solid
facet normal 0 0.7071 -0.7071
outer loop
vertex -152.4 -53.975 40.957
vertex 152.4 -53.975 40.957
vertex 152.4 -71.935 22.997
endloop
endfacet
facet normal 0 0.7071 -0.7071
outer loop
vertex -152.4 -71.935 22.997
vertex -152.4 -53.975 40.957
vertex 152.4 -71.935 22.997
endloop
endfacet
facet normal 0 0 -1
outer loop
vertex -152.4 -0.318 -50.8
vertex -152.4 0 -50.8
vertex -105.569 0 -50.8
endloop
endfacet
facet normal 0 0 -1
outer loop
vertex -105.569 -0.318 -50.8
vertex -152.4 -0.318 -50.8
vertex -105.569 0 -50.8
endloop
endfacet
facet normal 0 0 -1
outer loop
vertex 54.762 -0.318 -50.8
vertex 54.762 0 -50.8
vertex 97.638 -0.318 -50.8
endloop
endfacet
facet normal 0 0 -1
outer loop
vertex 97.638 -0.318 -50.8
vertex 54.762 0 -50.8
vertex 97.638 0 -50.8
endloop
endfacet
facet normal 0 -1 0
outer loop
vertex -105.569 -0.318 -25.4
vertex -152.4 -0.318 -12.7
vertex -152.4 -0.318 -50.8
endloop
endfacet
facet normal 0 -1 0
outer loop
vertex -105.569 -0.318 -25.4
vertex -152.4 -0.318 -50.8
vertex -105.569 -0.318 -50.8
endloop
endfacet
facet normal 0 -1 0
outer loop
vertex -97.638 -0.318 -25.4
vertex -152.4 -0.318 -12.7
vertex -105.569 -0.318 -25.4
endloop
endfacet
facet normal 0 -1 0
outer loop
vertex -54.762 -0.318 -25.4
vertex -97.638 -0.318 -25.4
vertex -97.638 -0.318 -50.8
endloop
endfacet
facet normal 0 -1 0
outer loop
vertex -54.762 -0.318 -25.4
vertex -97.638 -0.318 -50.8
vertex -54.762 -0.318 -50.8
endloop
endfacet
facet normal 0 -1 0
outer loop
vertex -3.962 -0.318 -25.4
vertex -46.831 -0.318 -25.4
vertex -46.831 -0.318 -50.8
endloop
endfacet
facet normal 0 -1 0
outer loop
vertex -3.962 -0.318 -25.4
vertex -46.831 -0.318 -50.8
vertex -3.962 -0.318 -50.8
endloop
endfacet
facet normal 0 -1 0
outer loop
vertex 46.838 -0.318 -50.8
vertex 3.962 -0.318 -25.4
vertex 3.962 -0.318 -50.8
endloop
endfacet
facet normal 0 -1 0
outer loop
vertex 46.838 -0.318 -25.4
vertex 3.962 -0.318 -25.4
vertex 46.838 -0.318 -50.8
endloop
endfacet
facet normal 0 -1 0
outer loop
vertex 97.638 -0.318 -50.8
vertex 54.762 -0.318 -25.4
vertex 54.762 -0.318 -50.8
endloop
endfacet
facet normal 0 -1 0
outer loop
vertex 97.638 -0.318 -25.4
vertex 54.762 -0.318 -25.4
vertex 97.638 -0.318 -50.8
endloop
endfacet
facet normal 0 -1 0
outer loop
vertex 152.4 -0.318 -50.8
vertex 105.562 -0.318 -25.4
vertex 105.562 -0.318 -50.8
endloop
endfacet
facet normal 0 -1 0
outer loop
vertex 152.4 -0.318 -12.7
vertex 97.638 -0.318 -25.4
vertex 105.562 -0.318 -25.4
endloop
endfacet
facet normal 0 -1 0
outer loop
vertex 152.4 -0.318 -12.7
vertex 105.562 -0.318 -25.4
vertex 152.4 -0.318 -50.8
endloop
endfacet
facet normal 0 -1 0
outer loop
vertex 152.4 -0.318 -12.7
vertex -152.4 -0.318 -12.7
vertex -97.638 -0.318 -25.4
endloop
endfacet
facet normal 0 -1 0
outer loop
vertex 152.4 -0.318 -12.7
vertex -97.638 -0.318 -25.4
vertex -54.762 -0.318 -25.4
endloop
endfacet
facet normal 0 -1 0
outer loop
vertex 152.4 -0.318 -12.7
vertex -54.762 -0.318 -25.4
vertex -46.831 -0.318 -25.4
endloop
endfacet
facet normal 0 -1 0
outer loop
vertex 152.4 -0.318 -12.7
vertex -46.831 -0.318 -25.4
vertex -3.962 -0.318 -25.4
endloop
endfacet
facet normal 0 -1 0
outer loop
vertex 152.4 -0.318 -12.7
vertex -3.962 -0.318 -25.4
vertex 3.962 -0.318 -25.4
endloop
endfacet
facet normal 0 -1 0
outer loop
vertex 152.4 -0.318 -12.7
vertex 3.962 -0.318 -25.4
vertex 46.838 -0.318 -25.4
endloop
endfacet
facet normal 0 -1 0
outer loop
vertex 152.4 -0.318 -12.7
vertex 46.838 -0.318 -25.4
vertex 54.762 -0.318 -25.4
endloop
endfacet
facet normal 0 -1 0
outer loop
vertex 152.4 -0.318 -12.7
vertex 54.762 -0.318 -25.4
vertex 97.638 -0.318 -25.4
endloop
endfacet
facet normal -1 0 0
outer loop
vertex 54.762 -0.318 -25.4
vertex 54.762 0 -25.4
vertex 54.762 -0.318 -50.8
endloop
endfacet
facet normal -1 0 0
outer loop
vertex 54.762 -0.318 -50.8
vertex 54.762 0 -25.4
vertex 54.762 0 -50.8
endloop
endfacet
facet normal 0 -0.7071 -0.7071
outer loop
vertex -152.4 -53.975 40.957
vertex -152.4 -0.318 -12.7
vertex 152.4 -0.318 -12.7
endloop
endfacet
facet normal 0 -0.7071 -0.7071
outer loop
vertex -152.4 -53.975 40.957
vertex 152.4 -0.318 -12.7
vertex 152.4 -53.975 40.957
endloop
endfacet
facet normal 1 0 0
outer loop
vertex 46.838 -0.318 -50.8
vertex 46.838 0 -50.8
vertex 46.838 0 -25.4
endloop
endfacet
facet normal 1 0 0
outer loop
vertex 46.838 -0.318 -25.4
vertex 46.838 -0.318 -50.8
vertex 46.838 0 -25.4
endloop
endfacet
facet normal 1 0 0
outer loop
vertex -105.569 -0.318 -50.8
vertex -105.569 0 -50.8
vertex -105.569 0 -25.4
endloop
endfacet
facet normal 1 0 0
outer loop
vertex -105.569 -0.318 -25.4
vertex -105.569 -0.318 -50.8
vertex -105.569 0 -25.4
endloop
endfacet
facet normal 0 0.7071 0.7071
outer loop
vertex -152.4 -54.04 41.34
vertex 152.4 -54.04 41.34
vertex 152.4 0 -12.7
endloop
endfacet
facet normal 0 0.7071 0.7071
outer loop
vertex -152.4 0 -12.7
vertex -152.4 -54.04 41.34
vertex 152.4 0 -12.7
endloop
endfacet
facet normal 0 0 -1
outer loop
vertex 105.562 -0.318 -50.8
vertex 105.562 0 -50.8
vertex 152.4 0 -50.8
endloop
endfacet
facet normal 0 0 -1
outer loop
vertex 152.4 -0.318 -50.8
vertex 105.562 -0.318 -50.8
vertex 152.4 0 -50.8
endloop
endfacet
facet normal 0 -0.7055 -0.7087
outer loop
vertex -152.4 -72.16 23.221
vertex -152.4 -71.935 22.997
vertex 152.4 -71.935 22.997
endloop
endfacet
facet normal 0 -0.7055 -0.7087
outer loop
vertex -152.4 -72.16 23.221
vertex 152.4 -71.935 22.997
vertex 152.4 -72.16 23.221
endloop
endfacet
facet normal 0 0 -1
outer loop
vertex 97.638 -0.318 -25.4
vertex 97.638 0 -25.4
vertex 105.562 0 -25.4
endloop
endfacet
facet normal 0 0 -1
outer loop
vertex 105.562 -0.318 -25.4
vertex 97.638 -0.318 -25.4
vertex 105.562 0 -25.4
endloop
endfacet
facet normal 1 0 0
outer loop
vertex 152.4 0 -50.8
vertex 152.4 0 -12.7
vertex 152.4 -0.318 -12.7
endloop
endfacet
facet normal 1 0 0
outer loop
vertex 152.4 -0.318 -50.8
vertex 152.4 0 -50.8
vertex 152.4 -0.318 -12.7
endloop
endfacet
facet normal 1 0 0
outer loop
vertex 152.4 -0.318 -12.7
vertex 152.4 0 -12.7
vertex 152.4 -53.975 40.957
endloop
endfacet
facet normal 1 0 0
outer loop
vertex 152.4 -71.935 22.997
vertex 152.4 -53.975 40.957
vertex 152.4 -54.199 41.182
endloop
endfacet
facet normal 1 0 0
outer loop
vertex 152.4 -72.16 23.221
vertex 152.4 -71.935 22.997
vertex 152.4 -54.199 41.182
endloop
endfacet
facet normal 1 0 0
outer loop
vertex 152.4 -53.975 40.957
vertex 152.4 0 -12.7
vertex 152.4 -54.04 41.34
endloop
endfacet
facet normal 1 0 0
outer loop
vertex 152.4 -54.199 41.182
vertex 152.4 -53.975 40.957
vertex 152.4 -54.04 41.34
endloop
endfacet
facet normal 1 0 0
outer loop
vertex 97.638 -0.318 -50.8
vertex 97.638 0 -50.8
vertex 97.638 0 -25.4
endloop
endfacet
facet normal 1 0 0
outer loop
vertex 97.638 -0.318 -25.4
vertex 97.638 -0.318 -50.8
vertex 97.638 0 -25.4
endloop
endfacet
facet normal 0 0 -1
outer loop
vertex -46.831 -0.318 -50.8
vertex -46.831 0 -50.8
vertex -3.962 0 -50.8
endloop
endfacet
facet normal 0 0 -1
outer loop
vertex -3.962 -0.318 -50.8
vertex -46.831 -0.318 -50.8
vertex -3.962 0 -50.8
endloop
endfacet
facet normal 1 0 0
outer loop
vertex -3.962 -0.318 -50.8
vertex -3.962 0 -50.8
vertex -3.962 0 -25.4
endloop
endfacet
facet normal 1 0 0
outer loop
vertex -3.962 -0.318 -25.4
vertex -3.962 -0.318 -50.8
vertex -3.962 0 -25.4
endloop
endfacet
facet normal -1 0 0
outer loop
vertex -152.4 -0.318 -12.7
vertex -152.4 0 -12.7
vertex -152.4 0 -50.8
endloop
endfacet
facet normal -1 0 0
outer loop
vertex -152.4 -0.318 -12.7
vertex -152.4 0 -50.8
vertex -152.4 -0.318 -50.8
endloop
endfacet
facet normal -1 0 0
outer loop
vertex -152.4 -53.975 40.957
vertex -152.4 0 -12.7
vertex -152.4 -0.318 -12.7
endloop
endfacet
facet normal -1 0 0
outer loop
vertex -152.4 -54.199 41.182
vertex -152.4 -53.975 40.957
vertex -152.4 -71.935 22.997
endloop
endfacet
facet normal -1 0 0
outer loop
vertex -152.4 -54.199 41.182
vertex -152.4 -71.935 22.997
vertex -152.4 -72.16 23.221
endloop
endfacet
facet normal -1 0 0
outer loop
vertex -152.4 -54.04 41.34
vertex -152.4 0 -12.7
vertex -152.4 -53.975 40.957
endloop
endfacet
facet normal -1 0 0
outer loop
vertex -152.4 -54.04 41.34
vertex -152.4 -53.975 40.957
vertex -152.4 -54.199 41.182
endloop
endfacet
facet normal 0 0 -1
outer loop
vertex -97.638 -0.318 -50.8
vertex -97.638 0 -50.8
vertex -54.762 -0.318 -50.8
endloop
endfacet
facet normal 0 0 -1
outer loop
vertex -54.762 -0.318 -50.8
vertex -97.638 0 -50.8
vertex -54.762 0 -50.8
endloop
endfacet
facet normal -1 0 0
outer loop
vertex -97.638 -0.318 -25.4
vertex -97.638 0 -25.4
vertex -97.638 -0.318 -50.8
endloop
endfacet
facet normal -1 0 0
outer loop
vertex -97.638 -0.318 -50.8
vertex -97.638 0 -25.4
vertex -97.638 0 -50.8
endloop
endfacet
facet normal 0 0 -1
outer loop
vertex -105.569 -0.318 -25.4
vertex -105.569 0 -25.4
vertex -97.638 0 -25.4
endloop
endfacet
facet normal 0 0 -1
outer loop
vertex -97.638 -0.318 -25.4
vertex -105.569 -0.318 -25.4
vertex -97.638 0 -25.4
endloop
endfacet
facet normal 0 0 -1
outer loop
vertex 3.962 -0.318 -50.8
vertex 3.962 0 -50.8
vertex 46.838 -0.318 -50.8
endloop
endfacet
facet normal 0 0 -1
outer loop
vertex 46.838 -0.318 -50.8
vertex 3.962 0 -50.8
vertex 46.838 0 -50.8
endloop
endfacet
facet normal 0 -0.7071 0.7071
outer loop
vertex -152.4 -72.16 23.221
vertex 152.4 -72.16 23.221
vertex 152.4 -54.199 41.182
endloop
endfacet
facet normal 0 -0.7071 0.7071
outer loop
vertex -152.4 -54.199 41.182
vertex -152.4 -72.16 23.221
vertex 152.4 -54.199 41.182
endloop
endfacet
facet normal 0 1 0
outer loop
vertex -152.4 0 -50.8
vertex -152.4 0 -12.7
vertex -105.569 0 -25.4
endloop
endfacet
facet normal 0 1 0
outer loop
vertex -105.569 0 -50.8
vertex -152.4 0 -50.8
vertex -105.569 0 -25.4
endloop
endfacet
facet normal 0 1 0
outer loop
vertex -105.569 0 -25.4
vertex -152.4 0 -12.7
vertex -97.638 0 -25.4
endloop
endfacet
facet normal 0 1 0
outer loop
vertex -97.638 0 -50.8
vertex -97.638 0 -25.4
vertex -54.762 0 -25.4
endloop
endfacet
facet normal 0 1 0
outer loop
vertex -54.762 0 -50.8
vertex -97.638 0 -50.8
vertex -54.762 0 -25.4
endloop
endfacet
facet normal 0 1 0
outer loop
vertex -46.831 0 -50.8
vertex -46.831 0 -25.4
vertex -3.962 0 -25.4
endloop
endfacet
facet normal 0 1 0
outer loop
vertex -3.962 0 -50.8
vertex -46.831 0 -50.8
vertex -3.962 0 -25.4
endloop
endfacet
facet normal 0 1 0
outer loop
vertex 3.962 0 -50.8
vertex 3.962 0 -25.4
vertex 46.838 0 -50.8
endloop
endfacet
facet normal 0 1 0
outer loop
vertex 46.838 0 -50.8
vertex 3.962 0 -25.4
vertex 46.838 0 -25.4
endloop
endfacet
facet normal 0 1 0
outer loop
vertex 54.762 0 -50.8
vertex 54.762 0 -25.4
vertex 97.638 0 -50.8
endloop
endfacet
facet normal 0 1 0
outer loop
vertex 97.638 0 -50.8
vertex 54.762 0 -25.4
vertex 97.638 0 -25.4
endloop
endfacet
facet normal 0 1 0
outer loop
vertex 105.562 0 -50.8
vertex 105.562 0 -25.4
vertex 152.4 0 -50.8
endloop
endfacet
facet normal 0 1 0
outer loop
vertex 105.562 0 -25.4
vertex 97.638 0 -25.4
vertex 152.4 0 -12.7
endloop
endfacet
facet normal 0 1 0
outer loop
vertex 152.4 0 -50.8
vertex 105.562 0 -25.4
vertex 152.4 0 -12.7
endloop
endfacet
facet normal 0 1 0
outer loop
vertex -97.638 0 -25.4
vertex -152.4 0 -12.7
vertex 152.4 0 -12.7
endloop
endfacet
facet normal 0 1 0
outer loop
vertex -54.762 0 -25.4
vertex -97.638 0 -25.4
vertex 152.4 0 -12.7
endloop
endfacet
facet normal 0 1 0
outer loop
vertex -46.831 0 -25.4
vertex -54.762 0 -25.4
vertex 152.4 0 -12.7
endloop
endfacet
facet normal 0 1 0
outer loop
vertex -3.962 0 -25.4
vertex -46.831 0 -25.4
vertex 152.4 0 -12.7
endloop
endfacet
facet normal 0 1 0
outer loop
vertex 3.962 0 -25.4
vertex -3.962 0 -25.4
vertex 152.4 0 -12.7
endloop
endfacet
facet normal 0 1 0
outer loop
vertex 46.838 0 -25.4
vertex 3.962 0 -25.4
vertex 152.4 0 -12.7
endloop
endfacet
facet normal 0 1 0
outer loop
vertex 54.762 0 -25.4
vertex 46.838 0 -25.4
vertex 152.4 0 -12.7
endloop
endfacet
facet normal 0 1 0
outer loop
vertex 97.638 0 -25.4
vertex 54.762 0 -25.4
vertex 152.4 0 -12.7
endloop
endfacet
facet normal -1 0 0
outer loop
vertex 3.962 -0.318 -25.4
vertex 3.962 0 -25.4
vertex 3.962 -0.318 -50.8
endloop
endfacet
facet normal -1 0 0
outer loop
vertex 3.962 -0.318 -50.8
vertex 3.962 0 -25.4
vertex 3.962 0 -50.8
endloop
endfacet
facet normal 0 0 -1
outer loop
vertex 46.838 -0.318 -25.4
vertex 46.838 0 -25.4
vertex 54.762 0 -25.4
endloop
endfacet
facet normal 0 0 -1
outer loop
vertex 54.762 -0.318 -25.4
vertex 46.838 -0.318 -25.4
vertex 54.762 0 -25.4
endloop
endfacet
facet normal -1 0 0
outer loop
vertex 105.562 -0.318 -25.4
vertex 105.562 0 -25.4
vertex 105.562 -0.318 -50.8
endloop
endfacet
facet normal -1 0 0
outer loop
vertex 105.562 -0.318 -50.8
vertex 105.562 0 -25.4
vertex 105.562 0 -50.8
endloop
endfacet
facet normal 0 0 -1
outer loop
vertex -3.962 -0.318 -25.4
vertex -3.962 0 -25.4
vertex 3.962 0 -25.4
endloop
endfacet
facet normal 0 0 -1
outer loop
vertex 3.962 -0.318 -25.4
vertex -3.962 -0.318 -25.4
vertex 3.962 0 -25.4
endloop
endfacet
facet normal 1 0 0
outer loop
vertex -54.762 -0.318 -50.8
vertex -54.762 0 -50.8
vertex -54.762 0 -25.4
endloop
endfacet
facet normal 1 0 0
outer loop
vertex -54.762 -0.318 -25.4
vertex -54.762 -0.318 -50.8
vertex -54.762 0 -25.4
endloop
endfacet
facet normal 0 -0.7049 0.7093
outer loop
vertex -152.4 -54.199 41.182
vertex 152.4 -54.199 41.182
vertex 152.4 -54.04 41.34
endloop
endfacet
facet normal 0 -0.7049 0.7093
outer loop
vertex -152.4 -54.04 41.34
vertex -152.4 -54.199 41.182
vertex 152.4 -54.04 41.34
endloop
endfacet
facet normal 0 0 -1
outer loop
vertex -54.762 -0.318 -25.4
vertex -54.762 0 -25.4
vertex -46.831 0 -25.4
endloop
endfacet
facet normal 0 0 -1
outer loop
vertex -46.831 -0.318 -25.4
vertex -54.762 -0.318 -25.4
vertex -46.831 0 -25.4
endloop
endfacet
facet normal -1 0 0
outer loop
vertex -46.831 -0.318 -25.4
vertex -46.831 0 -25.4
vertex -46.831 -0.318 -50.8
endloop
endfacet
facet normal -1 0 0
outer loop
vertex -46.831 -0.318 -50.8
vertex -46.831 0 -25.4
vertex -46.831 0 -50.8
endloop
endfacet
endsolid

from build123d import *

# Parameters (mm, degrees)
F1_DEPTH = 0.3175
F3_DEPTH = 304.8
F5_DEPTH = 304.8


with BuildPart() as f1:
    # F0 (on Front) → F1 (new body)
    with BuildSketch(Plane.XZ):
        Polygon((105.5624, -50.8), (152.4, -50.8), (152.4, -12.7), (-152.4, -12.7), (-152.4, -50.8), (-105.56875, -50.8), (-105.56875, -25.4), (-97.6376, -25.4), (-97.6376, -50.8), (-54.7624, -50.8), (-54.7624, -25.4), (-46.83125, -25.4), (-46.83125, -50.8), (-3.9624, -50.8), (-3.9624, -25.4), (3.9624, -25.4), (3.9624, -50.8), (46.8376, -50.8), (46.8376, -25.4), (54.7624, -25.4), (54.7624, -50.8), (97.6376, -50.8), (97.6376, -25.4), (105.5624, -25.4), align=None)
    extrude(amount=F1_DEPTH)

    # F2 (on face) → F3 (join)
    with BuildSketch(Plane(origin=(-152.4, 0, 0), x_dir=(0, -1, 0), z_dir=(-1, 0, 0))):
        Polygon((0, -12.7), (0.3175, -12.7), (54.199037, 41.181537), (54.040287, 41.340287), align=None)
    extrude(amount=-F3_DEPTH)

    # F4 (on face) → F5 (join)
    with BuildSketch(Plane(origin=(-152.4, 0, 0), x_dir=(0, -1, 0), z_dir=(-1, 0, 0))):
        Polygon((72.159549, 23.221024), (54.199037, 41.181537), (53.97453, 40.95703), (71.935043, 22.996518), align=None)
    extrude(amount=-F5_DEPTH)


solid = f1.part
